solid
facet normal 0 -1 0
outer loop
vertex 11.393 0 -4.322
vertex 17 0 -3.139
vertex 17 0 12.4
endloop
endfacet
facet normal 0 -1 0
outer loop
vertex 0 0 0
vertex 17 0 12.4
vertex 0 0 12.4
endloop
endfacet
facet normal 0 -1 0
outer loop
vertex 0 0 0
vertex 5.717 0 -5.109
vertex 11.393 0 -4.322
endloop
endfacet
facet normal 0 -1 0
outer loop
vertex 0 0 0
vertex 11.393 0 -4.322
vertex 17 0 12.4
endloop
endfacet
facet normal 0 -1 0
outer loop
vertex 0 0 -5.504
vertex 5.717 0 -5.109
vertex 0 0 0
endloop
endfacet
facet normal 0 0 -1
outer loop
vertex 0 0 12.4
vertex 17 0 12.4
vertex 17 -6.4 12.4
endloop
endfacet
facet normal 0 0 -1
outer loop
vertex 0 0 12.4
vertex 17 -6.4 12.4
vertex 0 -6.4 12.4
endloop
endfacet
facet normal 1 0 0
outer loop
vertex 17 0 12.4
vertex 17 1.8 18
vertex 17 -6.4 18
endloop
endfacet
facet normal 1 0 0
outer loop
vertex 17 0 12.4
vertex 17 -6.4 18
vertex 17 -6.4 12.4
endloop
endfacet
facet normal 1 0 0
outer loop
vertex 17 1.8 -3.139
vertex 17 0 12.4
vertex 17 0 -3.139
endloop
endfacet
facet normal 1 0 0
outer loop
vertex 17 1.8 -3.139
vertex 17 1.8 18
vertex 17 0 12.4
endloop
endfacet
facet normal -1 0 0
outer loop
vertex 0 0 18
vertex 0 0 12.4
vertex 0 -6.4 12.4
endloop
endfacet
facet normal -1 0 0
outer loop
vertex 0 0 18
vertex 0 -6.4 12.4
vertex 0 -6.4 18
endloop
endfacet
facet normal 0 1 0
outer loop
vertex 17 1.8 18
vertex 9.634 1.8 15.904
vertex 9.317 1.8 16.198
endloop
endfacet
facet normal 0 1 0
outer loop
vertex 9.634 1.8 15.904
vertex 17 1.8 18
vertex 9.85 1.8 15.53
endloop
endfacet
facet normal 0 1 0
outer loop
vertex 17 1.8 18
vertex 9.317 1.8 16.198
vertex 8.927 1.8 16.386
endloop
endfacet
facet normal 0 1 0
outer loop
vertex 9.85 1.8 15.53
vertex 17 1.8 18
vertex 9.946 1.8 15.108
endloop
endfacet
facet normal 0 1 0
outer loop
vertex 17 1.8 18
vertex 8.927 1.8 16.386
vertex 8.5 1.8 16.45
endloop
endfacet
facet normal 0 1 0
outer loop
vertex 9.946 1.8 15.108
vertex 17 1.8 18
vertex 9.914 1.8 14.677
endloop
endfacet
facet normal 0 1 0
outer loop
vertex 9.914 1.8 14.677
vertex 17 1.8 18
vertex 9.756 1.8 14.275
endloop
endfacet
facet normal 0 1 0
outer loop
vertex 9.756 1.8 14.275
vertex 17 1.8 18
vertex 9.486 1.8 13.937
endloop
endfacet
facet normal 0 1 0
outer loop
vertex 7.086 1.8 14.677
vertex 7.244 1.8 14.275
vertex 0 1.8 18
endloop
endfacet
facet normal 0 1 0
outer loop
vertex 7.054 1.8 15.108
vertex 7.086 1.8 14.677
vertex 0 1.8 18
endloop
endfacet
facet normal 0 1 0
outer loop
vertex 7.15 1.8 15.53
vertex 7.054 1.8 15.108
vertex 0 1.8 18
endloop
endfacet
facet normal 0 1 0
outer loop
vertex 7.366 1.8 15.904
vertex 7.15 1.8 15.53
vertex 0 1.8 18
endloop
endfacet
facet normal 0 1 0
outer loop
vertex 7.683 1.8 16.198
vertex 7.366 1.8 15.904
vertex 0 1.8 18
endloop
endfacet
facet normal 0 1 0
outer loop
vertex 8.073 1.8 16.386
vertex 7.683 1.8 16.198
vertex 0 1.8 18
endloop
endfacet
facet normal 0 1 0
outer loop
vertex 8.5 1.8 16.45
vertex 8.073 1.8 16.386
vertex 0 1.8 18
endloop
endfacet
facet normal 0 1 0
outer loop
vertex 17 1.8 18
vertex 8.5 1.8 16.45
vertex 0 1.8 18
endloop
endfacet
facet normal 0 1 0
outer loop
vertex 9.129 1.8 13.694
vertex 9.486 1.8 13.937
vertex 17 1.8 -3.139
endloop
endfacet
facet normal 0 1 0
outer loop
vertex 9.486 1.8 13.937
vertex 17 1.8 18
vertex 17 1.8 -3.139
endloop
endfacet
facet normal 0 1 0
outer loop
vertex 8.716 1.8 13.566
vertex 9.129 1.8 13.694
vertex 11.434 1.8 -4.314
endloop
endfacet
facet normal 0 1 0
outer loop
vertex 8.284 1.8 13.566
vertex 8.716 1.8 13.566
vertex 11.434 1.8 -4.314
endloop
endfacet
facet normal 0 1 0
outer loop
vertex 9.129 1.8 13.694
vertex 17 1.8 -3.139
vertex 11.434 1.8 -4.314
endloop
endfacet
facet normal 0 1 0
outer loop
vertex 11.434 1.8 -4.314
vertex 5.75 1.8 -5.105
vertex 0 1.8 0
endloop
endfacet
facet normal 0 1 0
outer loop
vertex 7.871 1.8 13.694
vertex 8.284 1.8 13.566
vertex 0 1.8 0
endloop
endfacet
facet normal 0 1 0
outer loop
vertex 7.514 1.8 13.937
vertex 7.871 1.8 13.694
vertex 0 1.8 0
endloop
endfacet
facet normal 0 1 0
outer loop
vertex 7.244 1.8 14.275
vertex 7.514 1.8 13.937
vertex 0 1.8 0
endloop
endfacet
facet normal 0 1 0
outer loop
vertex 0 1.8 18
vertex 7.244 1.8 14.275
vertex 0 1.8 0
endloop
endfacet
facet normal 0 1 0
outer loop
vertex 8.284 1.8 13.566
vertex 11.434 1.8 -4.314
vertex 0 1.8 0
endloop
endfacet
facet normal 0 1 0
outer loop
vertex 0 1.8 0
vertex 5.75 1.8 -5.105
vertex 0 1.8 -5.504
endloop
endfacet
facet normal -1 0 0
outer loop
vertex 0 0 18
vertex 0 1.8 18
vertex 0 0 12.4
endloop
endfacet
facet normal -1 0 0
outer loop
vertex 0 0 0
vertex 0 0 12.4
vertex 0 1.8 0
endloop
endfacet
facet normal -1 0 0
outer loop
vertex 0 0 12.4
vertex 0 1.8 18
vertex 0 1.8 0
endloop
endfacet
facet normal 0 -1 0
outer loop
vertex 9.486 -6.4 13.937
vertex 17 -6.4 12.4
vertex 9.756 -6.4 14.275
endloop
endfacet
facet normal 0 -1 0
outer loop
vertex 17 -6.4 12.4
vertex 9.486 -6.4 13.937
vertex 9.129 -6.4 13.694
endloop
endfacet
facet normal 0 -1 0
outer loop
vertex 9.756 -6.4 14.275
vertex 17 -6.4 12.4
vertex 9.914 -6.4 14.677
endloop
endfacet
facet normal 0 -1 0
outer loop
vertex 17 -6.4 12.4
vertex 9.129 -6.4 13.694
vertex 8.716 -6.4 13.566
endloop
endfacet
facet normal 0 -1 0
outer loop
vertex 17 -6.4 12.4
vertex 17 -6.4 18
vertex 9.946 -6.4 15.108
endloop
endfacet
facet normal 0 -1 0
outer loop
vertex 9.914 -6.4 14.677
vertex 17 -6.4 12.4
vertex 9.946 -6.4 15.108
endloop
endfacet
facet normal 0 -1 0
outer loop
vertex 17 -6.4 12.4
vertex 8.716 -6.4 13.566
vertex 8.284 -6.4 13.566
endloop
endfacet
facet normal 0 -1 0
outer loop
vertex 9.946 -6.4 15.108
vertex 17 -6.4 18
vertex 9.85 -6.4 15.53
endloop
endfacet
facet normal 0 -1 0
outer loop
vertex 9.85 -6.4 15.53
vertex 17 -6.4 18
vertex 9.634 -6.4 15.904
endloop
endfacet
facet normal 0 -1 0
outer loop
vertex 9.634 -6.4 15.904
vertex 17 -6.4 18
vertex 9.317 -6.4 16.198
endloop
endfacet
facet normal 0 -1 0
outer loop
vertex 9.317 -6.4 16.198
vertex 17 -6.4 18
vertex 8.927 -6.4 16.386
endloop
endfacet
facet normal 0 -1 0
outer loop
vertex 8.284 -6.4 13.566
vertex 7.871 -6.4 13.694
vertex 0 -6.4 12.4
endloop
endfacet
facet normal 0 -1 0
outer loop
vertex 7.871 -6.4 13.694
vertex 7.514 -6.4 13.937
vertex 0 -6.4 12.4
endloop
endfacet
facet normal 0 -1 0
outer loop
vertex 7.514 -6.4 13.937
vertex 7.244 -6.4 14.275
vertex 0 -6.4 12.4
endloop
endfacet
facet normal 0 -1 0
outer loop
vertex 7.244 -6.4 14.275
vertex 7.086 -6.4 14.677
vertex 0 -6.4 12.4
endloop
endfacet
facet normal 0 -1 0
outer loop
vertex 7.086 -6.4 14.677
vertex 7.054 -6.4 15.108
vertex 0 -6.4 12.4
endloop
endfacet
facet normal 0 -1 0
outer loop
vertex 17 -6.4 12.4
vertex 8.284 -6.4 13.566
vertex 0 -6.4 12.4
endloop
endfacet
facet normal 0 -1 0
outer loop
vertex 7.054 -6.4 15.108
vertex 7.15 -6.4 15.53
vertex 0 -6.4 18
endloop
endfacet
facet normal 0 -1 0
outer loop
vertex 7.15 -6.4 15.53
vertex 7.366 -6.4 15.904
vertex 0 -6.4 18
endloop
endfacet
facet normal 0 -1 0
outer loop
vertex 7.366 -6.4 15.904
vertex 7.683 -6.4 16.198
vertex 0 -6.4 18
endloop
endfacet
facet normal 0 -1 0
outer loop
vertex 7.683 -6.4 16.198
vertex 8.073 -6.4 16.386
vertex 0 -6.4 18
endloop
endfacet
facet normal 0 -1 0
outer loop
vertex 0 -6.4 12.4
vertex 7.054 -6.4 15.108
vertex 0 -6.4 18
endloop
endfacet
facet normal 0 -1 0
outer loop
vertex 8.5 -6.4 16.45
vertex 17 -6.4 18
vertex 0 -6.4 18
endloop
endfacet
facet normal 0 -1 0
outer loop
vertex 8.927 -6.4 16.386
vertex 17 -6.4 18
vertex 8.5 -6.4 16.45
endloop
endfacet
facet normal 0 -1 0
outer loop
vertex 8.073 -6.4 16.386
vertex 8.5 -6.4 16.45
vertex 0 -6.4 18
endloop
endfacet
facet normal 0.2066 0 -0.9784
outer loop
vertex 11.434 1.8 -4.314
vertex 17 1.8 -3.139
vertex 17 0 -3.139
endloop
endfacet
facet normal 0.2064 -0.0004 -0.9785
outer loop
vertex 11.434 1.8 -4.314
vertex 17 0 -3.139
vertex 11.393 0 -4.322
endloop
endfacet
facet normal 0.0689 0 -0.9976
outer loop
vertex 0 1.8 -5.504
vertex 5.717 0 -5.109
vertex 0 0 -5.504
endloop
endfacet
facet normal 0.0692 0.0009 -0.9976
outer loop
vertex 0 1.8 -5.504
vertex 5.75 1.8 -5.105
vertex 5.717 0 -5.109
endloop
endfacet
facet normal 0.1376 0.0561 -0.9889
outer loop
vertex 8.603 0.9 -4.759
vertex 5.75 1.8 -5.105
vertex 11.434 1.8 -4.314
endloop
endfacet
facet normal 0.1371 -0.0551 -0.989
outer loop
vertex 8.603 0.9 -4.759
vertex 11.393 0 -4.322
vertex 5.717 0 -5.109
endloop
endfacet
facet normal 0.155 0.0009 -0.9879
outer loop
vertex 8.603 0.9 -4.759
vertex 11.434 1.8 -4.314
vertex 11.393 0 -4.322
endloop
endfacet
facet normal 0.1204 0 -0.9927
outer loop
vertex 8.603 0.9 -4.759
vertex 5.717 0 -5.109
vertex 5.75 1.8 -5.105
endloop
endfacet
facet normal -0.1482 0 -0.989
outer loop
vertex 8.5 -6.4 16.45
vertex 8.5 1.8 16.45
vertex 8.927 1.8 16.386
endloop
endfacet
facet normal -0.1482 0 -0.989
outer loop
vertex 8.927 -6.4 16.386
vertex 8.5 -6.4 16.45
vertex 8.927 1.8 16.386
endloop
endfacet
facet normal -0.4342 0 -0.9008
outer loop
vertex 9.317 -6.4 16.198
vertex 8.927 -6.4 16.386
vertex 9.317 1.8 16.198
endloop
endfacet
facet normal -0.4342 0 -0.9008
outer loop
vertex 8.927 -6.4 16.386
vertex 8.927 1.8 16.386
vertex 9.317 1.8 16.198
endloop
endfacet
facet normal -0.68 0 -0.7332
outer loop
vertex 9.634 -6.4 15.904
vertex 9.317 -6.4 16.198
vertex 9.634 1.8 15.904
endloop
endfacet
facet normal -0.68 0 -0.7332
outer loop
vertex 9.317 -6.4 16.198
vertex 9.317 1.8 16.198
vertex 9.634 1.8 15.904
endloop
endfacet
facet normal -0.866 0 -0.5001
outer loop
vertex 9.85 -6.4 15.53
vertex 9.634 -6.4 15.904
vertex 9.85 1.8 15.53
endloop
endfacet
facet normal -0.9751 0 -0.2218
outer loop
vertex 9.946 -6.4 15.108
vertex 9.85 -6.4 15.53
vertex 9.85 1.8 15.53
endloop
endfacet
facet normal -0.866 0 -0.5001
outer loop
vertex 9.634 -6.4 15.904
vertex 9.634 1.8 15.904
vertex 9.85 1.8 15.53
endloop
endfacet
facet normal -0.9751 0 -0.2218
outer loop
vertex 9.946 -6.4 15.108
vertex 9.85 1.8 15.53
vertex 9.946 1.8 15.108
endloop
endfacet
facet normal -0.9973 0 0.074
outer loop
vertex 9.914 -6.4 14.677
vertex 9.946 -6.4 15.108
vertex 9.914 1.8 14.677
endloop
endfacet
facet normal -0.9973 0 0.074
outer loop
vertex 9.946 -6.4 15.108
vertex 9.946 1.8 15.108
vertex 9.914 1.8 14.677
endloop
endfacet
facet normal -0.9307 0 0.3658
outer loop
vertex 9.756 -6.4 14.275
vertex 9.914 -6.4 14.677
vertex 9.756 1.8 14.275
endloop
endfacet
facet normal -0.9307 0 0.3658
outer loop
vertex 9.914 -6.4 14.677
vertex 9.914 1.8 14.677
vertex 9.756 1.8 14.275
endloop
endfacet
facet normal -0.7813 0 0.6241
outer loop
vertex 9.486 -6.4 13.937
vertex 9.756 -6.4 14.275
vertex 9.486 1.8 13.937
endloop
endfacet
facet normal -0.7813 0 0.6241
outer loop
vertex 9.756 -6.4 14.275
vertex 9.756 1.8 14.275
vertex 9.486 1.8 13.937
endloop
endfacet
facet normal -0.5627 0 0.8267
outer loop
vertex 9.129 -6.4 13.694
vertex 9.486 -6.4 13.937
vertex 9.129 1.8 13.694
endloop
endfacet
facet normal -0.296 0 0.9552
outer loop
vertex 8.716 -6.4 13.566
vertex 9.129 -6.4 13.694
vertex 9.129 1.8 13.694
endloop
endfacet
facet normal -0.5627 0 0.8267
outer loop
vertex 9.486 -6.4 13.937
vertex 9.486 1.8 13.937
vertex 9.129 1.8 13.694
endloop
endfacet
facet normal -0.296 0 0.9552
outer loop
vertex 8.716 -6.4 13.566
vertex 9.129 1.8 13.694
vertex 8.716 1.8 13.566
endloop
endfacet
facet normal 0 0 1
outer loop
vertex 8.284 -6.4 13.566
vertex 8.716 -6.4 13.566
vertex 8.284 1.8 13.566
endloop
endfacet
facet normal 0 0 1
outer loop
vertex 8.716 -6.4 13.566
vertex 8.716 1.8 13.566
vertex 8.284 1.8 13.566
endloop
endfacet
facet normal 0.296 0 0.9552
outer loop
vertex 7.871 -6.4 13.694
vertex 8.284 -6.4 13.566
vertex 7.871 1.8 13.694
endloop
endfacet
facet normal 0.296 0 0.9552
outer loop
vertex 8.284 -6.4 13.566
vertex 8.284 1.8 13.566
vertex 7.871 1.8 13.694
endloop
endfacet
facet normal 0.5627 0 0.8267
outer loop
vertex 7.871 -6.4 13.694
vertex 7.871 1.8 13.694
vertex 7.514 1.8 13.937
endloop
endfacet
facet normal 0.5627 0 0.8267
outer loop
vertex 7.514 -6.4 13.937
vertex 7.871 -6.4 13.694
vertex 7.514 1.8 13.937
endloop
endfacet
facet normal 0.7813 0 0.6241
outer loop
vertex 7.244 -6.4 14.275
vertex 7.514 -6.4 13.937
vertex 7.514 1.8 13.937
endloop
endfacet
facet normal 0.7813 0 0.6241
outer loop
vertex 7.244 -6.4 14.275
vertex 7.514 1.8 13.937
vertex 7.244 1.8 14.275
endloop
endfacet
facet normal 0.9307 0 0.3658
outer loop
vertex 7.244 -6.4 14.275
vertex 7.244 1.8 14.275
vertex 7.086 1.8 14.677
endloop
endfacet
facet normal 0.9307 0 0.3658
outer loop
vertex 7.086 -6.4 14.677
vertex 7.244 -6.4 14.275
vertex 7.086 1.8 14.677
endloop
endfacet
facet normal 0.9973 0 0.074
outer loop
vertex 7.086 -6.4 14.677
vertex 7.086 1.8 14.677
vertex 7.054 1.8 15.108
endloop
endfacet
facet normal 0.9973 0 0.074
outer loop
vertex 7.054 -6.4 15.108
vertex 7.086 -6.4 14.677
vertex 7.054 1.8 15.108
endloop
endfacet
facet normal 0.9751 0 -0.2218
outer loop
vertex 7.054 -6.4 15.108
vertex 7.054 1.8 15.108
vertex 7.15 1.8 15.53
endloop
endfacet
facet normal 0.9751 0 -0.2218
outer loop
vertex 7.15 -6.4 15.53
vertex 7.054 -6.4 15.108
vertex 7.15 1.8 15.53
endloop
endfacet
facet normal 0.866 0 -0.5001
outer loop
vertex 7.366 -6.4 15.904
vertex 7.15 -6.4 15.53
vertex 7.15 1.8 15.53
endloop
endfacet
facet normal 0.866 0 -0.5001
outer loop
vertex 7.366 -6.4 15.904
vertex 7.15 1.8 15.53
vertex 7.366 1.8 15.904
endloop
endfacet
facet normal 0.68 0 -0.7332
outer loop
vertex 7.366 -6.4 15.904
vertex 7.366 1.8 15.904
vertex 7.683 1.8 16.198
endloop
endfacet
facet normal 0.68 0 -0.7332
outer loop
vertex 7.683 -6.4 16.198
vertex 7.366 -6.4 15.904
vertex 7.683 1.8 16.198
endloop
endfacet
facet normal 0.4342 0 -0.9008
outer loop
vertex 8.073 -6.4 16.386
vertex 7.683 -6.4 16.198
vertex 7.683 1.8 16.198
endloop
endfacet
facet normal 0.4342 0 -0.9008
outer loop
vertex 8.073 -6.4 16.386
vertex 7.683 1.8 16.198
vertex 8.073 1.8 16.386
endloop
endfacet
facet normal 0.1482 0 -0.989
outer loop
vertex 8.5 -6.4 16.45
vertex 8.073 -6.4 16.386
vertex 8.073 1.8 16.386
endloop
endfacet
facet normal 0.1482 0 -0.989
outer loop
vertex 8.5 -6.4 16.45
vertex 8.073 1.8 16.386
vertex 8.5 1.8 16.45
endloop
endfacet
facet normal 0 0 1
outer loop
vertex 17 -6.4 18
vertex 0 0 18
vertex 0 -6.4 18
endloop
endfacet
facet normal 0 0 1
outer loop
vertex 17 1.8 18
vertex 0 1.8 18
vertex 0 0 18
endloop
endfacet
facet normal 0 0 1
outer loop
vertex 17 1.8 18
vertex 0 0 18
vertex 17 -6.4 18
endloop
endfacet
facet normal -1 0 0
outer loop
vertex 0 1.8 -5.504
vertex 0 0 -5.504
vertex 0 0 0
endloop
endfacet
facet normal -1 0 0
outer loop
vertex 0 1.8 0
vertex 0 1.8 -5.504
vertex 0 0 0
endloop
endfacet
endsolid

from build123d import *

# Parameters (mm, degrees)
BOSS_EXTRUDE1_DEPTH = 1.8
CUT_EXTRUDE2_REACH  = 3.8
BOSS_EXTRUDE2_DEPTH = 1.8
BOSS_EXTRUDE3_DEPTH = 6.4
CUT_EXTRUDE3_REACH  = 10.2
SKETCH7_R           = 1.45


with BuildPart() as part:
    # Sketch1 → Boss-Extrude1 (new body)
    with BuildSketch(Plane(origin=(0, 0, 0), x_dir=(1, 0, 0), z_dir=(0, 1, 0))):
        Polygon((0, 15), (0, 0), (17, 0), (17, 10), align=None)
    extrude(amount=BOSS_EXTRUDE1_DEPTH)

    # Sketch3 → Cut-Extrude2 (cut, up to next)
    with BuildSketch(Plane(origin=(0, 1.8, 0), x_dir=(1, 0, 0), z_dir=(0, 1, 0)), mode=Mode.PRIVATE) as cut_extrude2_sk1:
        with BuildLine():
            Line((0, 15), (0, 5.504405832))
            add(Edge.make_bspline(
                [(17, 3.138617849), (8.707332044, 5.198817795), (0, 5.504405832)],
                knots=[4.238740022, 4.238740022, 4.238740022, 4.471680234, 4.471680234, 4.471680234], degree=2, weights=[1, 0.993225021, 1]))
            Line((17, 3.138617849), (17, 10))
            Line((17, 10), (0, 15))
        make_face()
    cut_extrude2_tool1 = extrude(cut_extrude2_sk1.sketch, amount=-CUT_EXTRUDE2_REACH, mode=Mode.PRIVATE) & part.part
    add(cut_extrude2_tool1.solids().sort_by_distance((8.024676, 1.8, -8.663074))[0], mode=Mode.SUBTRACT)

    # Sketch5 → Boss-Extrude2 (add)
    with BuildSketch(Plane(origin=(0, 1.8, 0), x_dir=(1, 0, 0), z_dir=(0, 1, 0))):
        Polygon((17, 0), (17, -18), (2.5e-08, -18), (0, 0), align=None)
    extrude(amount=-BOSS_EXTRUDE2_DEPTH)

    # Sketch6 → Boss-Extrude3 (add)
    with BuildSketch(Plane.XZ):
        Polygon((2.5e-08, 18), (17, 18), (17, 12.4), (1.9e-08, 12.4), align=None)
    extrude(amount=BOSS_EXTRUDE3_DEPTH)

    # Sketch7 → Cut-Extrude3 (cut, up to next)
    with BuildSketch(Plane(origin=(0, 1.8, 0), x_dir=(1, 0, 0), z_dir=(0, 1, 0)), mode=Mode.PRIVATE) as cut_extrude3_sk1:
        with Locations(Location((8.500000012, -15, 0), (0, 0, 270))):  # turned: the seam where the file's is
            Circle(SKETCH7_R)
    cut_extrude3_tool1 = extrude(cut_extrude3_sk1.sketch, amount=-CUT_EXTRUDE3_REACH, mode=Mode.PRIVATE) & part.part
    add(cut_extrude3_tool1.solids().sort_by_distance((8.5, 1.8, 15))[0], mode=Mode.SUBTRACT)


solid = part.part
